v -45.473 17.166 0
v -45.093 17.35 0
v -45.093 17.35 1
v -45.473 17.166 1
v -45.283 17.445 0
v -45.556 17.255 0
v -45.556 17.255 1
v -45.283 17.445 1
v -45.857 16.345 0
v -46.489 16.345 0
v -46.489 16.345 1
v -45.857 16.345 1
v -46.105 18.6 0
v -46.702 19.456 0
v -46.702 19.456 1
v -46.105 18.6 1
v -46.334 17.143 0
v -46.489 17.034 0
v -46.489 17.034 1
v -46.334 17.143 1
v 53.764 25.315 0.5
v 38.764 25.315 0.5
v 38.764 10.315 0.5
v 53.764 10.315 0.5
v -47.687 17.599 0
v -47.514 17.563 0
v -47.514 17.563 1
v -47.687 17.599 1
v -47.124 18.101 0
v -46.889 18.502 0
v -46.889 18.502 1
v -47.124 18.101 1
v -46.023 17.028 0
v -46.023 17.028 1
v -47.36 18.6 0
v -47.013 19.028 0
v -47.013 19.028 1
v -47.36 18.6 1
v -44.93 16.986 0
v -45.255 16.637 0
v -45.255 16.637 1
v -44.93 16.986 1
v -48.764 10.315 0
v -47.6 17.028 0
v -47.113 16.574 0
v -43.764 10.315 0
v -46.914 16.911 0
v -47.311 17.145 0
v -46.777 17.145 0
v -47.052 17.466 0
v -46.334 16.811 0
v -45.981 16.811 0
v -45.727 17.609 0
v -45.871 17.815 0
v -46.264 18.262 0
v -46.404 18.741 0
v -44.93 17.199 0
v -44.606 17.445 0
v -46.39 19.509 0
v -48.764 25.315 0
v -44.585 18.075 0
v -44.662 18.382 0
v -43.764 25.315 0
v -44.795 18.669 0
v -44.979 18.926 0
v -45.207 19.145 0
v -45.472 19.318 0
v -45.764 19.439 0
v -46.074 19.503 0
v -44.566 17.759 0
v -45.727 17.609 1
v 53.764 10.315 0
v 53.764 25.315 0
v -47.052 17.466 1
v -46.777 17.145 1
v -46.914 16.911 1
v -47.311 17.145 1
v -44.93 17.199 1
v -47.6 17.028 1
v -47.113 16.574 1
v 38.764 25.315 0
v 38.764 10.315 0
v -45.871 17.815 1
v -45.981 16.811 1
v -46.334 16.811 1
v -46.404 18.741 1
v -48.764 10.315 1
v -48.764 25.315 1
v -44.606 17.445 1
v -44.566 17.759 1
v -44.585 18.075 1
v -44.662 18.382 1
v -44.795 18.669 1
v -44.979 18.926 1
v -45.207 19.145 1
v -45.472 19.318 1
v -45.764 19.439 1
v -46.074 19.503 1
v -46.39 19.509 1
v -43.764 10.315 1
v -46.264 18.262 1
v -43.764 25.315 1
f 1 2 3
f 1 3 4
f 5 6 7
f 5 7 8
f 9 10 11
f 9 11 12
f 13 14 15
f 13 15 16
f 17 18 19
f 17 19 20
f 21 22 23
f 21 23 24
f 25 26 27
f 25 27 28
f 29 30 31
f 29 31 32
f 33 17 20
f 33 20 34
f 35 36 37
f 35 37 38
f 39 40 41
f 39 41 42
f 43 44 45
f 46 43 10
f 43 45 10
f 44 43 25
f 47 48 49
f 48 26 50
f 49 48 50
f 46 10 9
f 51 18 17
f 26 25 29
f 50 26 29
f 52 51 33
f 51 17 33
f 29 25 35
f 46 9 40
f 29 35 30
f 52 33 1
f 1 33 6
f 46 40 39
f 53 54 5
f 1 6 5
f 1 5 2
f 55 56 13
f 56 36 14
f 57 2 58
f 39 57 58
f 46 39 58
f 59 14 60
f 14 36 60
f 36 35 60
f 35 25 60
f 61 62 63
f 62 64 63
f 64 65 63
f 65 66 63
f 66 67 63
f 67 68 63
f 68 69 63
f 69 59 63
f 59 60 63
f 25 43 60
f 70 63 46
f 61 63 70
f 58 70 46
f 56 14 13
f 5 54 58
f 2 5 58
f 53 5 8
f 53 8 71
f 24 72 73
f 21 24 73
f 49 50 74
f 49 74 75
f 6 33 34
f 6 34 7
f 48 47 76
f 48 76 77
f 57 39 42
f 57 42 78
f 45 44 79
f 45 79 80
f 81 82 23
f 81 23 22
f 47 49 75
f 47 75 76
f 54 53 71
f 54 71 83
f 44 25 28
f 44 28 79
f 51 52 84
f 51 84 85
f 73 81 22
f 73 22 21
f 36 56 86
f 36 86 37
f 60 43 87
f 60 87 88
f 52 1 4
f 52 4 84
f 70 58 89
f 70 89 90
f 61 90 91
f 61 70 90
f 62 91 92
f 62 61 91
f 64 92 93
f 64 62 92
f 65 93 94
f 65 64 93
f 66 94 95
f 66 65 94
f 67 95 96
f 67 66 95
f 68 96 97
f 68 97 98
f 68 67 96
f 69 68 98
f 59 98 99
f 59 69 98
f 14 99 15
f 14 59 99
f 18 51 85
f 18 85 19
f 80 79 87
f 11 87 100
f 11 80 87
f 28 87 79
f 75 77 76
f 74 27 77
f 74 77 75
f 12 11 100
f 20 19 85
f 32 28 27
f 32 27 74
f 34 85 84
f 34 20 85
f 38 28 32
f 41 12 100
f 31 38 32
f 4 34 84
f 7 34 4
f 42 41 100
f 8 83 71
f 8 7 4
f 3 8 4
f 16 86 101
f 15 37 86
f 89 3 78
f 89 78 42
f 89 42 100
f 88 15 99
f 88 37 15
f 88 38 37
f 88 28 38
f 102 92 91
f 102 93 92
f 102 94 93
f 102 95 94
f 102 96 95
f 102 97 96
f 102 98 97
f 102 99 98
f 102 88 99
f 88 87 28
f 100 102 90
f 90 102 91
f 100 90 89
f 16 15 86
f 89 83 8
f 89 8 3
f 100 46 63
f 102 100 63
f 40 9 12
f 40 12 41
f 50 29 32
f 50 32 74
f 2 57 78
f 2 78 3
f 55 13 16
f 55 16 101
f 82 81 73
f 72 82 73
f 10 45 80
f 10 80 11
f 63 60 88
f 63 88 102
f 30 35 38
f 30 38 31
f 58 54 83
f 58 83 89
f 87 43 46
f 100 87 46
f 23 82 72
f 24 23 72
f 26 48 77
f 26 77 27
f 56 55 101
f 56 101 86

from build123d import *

# Parameters (mm, degrees)
CROQUIS1_W              = 15
CROQUIS1_H              = 15
SALIENTE_EXTRUIR1_DEPTH = 0.5
CROQUIS2_W              = 5
CROQUIS2_H              = 15
SALIENTE_EXTRUIR2_DEPTH = 1


with BuildPart() as part:
    # Croquis1 → Saliente-Extruir1 (new body)
    with BuildSketch(Plane.XY):
        with Locations((46.263983636, 17.815050794)):
            Rectangle(CROQUIS1_W, CROQUIS1_H)
    extrude(amount=SALIENTE_EXTRUIR1_DEPTH)


with BuildPart() as body_2:
    # Croquis2 → Saliente-Extruir2 (new body)
    with BuildSketch(Plane.XY):
        with Locations((-46.263983636, 17.815050794)):
            Rectangle(CROQUIS2_W, CROQUIS2_H)
        with BuildLine():
            Line((-46.702364849, 19.456400566), (-46.104716051, 18.600270795))
            Line((-46.104716051, 18.600270795), (-46.263983636, 18.262314678))
            Line((-46.263983636, 18.262314678), (-46.40354045, 18.74109689))
            Line((-46.40354045, 18.74109689), (-47.013043673, 19.02833568))
            Line((-47.013043673, 19.02833568), (-47.359981629, 18.600270795))
            Line((-47.359981629, 18.600270795), (-46.888792293, 18.501705784))
            Line((-46.888792293, 18.501705784), (-47.124386961, 18.101439004))
            Line((-47.124386961, 18.101439004), (-47.051735301, 17.465613962))
            Line((-47.051735301, 17.465613962), (-46.776783931, 17.144837365))
            Line((-46.776783931, 17.144837365), (-46.914259616, 16.911271172))
            Line((-46.914259616, 16.911271172), (-47.311080091, 17.144837365))
            Line((-47.311080091, 17.144837365), (-47.513983636, 17.562992572))
            Line((-47.513983636, 17.562992572), (-47.686595328, 17.599100082))
            Line((-47.686595328, 17.599100082), (-47.600289482, 17.028054268))
            Line((-47.600289482, 17.028054268), (-47.112669854, 16.574179388))
            Line((-47.112669854, 16.574179388), (-46.489318425, 16.344717423))
            Line((-46.489318425, 16.344717423), (-45.856721312, 16.344717423))
            Line((-45.856721312, 16.344717423), (-45.254925471, 16.636729832))
            Line((-45.254925471, 16.636729832), (-44.93019506, 16.985603341))
            Line((-44.93019506, 16.985603341), (-44.93019506, 17.199134303))
            Line((-44.93019506, 17.199134303), (-45.092560266, 17.350263347))
            Line((-45.092560266, 17.350263347), (-45.473269715, 17.165529795))
            Line((-45.473269715, 17.165529795), (-45.980893746, 16.811166586))
            Line((-45.980893746, 16.811166586), (-46.333762043, 16.811166586))
            Line((-46.333762043, 16.811166586), (-46.489318425, 17.034000549))
            Line((-46.489318425, 17.034000549), (-46.333762043, 17.142591662))
            Line((-46.333762043, 17.142591662), (-46.022912745, 17.028164892))
            Line((-46.022912745, 17.028164892), (-45.555823392, 17.254812997))
            Line((-45.555823392, 17.254812997), (-45.28291499, 17.445325445))
            Line((-45.28291499, 17.445325445), (-45.727081731, 17.608827713))
            Line((-45.727081731, 17.608827713), (-45.871042355, 17.815050794))
            Line((-45.871042355, 17.815050794), (-44.605818889, 17.445325445))
            ThreePointArc((-44.605818889, 17.445325445), (-45.087942075, 19.041074207), (-46.702364849, 19.456400566))
        make_face(mode=Mode.SUBTRACT)
    extrude(amount=SALIENTE_EXTRUIR2_DEPTH)


solid = Compound([part.part, body_2.part])
